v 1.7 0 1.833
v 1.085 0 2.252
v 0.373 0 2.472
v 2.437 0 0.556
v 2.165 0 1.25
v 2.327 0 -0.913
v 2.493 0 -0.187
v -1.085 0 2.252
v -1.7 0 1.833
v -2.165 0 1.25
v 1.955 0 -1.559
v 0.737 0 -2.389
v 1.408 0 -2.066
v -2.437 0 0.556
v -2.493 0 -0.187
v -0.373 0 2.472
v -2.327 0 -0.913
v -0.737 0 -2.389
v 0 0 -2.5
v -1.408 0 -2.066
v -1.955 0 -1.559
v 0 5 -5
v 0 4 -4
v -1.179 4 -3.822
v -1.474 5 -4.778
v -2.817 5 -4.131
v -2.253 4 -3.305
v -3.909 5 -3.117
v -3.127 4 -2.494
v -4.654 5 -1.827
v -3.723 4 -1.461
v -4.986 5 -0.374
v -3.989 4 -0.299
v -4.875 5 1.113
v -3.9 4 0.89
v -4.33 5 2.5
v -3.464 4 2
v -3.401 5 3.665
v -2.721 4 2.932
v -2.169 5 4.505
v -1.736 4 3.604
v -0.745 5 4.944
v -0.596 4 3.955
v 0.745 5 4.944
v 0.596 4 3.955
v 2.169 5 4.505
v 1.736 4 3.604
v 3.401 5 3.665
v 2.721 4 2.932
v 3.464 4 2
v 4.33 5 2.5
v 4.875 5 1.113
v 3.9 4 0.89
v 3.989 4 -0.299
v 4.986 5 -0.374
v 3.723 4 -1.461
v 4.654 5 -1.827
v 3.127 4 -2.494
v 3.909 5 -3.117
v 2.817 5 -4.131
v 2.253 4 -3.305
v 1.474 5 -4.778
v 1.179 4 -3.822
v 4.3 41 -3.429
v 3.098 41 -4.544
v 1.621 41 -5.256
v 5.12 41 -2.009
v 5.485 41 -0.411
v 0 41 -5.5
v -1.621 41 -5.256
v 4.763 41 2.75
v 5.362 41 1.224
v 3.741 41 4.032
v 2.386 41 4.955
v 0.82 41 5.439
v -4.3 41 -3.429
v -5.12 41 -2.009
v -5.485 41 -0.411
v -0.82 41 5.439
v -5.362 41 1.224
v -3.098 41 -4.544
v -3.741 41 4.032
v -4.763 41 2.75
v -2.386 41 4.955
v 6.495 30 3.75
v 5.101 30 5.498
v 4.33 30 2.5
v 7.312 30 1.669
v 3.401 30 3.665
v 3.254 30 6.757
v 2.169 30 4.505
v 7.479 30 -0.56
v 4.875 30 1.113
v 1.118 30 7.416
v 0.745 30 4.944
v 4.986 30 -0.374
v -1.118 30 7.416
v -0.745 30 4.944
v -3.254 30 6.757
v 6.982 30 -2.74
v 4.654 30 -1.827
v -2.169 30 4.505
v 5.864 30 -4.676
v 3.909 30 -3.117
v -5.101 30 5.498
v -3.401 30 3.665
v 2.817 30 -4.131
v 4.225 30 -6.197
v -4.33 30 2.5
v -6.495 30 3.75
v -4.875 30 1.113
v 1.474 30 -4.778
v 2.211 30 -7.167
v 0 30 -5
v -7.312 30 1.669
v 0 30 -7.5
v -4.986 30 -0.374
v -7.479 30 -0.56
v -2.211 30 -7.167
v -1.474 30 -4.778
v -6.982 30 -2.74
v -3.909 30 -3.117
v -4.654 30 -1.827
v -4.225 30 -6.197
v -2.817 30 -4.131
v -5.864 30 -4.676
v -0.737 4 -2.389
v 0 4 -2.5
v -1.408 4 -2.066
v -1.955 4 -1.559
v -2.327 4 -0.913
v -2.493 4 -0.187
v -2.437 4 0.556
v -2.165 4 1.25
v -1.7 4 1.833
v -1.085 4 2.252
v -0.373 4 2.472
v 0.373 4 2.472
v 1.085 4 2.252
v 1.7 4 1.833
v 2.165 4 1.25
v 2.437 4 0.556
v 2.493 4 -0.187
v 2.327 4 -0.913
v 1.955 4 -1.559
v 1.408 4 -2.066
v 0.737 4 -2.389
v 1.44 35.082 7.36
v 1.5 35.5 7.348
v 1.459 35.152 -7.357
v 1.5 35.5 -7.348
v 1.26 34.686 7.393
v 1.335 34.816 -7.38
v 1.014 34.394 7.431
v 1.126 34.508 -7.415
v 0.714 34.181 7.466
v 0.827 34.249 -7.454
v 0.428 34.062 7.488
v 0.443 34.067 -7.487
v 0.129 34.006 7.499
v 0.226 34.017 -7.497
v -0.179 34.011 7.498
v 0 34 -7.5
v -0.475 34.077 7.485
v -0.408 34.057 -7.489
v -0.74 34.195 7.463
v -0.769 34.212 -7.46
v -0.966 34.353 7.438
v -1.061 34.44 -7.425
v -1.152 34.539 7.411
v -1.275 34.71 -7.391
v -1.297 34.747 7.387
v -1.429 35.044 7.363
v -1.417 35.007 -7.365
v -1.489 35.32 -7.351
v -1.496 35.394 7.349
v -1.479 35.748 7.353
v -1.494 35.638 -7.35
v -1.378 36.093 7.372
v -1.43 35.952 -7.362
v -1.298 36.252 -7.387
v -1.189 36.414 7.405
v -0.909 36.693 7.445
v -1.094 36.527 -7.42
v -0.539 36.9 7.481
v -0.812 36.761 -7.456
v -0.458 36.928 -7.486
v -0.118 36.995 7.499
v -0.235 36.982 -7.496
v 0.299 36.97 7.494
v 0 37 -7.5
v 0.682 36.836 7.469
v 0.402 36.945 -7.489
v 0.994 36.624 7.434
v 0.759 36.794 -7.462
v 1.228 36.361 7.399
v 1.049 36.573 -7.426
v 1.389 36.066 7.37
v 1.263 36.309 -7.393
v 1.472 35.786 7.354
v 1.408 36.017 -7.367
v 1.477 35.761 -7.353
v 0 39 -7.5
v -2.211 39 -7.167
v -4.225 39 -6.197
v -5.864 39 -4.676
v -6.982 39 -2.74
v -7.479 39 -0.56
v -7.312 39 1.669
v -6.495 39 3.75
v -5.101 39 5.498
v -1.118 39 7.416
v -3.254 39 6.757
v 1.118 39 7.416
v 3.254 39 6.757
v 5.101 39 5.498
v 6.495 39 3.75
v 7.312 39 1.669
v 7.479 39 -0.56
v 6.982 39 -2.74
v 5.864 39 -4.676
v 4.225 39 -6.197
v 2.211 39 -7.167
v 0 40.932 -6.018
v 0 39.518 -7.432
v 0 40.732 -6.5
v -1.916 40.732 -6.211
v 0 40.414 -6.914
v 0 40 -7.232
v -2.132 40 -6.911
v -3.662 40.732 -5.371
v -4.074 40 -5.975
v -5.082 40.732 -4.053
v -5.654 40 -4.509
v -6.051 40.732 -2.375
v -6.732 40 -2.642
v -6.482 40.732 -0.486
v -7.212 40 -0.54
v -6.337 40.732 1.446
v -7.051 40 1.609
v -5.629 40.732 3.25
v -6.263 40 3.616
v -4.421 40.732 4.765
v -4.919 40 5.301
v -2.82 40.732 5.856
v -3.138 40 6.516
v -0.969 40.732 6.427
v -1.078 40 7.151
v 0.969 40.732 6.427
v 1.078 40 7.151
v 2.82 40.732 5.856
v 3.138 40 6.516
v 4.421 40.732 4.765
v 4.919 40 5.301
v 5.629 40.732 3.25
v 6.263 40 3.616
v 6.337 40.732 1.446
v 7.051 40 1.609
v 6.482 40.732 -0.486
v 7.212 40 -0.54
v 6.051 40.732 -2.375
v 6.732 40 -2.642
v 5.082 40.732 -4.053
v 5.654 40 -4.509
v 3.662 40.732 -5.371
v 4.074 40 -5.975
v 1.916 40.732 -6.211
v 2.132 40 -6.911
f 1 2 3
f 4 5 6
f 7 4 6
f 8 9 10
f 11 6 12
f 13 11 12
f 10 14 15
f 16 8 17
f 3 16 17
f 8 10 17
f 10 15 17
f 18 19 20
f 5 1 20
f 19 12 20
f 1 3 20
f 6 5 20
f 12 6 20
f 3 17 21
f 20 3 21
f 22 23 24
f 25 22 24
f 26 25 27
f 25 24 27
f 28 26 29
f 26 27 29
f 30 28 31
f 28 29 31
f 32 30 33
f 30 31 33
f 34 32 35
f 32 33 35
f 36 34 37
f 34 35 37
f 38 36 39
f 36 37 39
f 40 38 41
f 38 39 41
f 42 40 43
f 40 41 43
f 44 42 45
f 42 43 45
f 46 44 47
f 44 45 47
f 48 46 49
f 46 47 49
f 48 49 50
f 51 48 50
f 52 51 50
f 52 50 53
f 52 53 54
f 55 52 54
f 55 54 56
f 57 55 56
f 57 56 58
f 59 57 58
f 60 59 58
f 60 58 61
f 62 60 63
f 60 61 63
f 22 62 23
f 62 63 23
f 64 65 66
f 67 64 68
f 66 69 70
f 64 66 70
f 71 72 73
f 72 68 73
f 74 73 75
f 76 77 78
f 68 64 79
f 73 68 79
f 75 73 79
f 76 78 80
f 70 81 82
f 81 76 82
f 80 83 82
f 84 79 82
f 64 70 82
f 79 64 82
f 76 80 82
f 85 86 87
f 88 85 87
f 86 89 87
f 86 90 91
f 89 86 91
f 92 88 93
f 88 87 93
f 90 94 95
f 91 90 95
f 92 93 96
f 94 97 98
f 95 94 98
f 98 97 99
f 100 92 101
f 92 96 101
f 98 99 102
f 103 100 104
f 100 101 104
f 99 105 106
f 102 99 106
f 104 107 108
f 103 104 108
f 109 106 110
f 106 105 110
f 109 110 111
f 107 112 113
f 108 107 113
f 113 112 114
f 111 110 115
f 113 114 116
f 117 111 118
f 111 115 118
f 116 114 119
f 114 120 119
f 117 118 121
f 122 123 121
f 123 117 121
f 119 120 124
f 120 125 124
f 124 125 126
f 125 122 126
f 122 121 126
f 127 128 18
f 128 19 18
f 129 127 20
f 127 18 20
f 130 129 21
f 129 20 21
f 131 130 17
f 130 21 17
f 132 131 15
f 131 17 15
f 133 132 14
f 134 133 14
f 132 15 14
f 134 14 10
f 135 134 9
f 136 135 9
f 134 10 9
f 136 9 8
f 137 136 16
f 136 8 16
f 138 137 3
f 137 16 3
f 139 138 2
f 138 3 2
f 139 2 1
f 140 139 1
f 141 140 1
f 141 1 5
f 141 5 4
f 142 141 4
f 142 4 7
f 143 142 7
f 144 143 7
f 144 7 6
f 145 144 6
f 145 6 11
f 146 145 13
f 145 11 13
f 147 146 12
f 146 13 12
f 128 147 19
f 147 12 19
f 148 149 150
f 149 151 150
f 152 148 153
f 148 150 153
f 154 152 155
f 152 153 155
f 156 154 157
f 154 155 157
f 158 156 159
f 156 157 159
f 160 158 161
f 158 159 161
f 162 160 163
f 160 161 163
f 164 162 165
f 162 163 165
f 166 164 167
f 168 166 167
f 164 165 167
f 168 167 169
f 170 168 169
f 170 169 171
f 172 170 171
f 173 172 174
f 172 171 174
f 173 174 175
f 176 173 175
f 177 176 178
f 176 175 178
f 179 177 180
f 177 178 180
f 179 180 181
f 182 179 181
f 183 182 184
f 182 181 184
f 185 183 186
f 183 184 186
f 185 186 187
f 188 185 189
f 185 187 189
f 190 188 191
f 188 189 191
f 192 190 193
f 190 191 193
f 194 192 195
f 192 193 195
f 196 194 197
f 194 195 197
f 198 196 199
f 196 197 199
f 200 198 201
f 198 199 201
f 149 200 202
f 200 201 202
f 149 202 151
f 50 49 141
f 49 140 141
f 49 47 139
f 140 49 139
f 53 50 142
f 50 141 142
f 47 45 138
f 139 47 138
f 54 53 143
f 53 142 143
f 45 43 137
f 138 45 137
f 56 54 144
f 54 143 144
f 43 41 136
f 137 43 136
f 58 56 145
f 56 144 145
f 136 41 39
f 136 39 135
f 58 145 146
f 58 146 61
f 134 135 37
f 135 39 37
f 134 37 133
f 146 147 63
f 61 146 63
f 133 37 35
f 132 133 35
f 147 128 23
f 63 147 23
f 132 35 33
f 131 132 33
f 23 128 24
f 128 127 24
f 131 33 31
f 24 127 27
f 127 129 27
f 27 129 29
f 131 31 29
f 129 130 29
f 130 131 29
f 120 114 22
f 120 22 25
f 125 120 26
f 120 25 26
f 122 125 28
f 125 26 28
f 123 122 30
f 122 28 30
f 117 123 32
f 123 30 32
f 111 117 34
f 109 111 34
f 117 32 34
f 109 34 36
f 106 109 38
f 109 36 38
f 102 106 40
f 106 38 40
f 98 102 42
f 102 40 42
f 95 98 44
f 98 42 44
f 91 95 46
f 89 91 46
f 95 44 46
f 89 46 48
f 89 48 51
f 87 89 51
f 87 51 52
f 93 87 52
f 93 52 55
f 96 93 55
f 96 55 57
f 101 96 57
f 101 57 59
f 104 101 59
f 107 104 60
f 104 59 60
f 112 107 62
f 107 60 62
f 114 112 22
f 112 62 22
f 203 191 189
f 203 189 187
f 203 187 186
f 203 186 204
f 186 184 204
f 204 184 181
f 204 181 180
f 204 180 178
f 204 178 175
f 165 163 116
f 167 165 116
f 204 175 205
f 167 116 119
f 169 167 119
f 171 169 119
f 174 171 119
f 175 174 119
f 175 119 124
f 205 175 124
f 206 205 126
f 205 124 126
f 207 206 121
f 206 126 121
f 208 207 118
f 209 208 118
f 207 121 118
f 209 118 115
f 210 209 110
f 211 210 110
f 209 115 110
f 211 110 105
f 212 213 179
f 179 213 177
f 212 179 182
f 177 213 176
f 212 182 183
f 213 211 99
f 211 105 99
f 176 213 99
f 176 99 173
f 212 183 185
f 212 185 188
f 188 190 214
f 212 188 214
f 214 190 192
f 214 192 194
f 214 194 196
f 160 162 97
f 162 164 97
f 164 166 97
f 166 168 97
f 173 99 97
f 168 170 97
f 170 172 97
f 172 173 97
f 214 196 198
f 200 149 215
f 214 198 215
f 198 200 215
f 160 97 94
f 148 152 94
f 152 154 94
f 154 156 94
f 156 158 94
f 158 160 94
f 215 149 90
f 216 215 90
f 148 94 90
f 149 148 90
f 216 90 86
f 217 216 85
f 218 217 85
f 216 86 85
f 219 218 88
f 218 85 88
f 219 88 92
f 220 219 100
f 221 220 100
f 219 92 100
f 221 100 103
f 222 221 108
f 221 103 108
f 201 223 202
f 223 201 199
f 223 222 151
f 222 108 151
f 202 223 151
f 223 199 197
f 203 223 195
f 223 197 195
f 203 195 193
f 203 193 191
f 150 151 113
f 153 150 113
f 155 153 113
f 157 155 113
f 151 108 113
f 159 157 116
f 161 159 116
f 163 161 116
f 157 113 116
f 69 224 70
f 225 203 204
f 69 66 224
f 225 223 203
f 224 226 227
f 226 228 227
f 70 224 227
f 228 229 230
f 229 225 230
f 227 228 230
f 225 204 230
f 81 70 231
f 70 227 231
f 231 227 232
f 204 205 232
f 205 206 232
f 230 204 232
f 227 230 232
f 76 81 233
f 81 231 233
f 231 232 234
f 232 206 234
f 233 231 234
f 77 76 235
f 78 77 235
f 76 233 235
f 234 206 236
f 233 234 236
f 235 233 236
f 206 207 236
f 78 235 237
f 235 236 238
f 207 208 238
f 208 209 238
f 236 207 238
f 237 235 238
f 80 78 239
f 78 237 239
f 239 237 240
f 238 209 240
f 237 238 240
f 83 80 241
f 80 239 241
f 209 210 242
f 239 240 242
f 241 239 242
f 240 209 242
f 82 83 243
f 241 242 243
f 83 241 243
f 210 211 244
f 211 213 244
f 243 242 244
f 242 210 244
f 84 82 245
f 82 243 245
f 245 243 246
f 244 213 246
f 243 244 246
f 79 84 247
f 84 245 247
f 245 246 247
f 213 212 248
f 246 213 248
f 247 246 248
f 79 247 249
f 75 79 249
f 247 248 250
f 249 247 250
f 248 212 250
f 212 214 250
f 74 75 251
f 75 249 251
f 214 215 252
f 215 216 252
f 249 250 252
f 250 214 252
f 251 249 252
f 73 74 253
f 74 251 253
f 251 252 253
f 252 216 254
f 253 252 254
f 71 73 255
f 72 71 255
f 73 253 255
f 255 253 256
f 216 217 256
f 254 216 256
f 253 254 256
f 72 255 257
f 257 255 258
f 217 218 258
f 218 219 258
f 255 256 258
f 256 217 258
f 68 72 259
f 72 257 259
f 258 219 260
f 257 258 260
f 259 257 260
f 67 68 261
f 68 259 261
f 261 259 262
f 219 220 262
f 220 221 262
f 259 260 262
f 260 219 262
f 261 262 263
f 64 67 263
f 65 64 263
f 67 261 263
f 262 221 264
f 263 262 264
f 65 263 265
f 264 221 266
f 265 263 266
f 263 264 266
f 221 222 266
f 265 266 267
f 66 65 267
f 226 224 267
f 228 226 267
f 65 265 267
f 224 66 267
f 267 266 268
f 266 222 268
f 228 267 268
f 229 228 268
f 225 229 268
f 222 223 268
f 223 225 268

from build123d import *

# Parameters (mm, degrees)
SKETCH_2_W     = 15
SKETCH_2_H     = 1.5
FILLET_1_R     = 2
CHAMFER_1_SIZE = 1


with BuildPart() as part:
    # 草圖1 → 旋轉1 (revolve)
    with BuildSketch(Plane(origin=(0, 0, 0), x_dir=(0, 0, -1), z_dir=(1, 0, 0)), mode=Mode.PRIVATE) as revolve_1_sk:
        Polygon((0, 41), (-7.5, 41), (-7.5, 30), (-5, 30), (-5, 4), (-2.5, 4), (-2.5, 0), (0, 0), align=None)
    revolve(revolve_1_sk.sketch.rotate(Axis((0, 0, 0), (0, 1, 0)), 180), axis=Axis((0, 0, 0), (0, 1, 0)))

    # 草圖2 → 除料-旋轉1 (revolve, cut)
    with BuildSketch(Plane(origin=(0, 0, 0), x_dir=(0, 0, -1), z_dir=(1, 0, 0)), mode=Mode.PRIVATE) as cut_revolve_1_sk:
        with Locations((0, 36.25)):
            Rectangle(SKETCH_2_W, SKETCH_2_H)
    revolve(cut_revolve_1_sk.sketch.rotate(Axis((0, 35.5, 7.5), (0, 0, -1)), 90), axis=Axis((0, 35.5, 7.5), (0, 0, -1)), mode=Mode.SUBTRACT)

    # 圓角1
    fillet_1_edges = [part.edges().sort_by_distance(p)[0] for p in [
        (0, 41, 7.5),
    ]]
    fillet(fillet_1_edges, radius=FILLET_1_R)

    # 導角1
    chamfer_1_edges = [part.edges().sort_by_distance(p)[0] for p in [
        (0, 4, 5),
    ]]
    chamfer(chamfer_1_edges, length=CHAMFER_1_SIZE)


solid = part.part
